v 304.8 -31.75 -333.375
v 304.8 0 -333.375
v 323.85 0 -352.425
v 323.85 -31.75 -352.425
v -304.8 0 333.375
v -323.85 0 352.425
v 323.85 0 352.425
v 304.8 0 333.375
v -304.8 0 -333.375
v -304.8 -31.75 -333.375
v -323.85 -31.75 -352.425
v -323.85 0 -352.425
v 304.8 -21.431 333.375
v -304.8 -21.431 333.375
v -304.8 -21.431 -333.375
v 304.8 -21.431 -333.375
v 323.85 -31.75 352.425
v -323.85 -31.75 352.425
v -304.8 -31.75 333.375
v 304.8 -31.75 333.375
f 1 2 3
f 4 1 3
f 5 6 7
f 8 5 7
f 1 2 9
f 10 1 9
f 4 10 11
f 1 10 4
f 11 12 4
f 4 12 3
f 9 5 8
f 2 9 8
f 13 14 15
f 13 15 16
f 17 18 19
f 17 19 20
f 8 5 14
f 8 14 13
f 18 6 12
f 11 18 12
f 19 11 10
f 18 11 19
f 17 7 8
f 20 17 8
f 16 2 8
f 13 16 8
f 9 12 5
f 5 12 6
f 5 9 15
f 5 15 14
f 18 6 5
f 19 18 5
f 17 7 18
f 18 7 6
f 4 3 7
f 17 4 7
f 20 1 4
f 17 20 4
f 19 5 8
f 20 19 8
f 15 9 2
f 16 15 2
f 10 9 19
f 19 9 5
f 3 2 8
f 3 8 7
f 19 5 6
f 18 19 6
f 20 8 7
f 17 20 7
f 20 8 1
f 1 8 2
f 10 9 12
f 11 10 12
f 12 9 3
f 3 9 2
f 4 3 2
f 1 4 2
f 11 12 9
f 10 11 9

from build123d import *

# Parameters (mm, degrees)
F0_W     = 609.6
F0_H     = 666.75
F1_DEPTH = 21.43125
F2_DEPTH = 31.75
F3_DEPTH = 31.75
F4_DEPTH = 31.75
F5_DEPTH = 31.75


with BuildPart() as f1:
    # F0 (on Front) → F1 (new body)
    with BuildSketch(Plane.XZ):
        Rectangle(F0_W, F0_H)
    extrude(amount=F1_DEPTH)


with BuildPart() as f2:
    # F0 (on Front) → F2 (new body)
    with BuildSketch(Plane.XZ):
        Polygon((-323.85, 352.425), (-304.8, 333.375), (304.8, 333.375), (323.85, 352.425), align=None)
    extrude(amount=F2_DEPTH)


with BuildPart() as f3:
    # F0 (on Front) → F3 (new body)
    with BuildSketch(Plane.XZ):
        Polygon((-304.8, -333.375), (-304.8, 333.375), (-323.85, 352.425), (-323.85, -352.425), align=None)
    extrude(amount=F3_DEPTH)


with BuildPart() as f4:
    # F0 (on Front) → F4 (new body)
    with BuildSketch(Plane.XZ):
        Polygon((304.8, -333.375), (-304.8, -333.375), (-323.85, -352.425), (323.85, -352.425), align=None)
    extrude(amount=F4_DEPTH)


with BuildPart() as f5:
    # F0 (on Front) → F5 (new body)
    with BuildSketch(Plane.XZ):
        Polygon((323.85, 352.425), (304.8, 333.375), (304.8, -333.375), (323.85, -352.425), align=None)
    extrude(amount=F5_DEPTH)


solid = Compound([f1.part, f2.part, f3.part, f4.part, f5.part])
